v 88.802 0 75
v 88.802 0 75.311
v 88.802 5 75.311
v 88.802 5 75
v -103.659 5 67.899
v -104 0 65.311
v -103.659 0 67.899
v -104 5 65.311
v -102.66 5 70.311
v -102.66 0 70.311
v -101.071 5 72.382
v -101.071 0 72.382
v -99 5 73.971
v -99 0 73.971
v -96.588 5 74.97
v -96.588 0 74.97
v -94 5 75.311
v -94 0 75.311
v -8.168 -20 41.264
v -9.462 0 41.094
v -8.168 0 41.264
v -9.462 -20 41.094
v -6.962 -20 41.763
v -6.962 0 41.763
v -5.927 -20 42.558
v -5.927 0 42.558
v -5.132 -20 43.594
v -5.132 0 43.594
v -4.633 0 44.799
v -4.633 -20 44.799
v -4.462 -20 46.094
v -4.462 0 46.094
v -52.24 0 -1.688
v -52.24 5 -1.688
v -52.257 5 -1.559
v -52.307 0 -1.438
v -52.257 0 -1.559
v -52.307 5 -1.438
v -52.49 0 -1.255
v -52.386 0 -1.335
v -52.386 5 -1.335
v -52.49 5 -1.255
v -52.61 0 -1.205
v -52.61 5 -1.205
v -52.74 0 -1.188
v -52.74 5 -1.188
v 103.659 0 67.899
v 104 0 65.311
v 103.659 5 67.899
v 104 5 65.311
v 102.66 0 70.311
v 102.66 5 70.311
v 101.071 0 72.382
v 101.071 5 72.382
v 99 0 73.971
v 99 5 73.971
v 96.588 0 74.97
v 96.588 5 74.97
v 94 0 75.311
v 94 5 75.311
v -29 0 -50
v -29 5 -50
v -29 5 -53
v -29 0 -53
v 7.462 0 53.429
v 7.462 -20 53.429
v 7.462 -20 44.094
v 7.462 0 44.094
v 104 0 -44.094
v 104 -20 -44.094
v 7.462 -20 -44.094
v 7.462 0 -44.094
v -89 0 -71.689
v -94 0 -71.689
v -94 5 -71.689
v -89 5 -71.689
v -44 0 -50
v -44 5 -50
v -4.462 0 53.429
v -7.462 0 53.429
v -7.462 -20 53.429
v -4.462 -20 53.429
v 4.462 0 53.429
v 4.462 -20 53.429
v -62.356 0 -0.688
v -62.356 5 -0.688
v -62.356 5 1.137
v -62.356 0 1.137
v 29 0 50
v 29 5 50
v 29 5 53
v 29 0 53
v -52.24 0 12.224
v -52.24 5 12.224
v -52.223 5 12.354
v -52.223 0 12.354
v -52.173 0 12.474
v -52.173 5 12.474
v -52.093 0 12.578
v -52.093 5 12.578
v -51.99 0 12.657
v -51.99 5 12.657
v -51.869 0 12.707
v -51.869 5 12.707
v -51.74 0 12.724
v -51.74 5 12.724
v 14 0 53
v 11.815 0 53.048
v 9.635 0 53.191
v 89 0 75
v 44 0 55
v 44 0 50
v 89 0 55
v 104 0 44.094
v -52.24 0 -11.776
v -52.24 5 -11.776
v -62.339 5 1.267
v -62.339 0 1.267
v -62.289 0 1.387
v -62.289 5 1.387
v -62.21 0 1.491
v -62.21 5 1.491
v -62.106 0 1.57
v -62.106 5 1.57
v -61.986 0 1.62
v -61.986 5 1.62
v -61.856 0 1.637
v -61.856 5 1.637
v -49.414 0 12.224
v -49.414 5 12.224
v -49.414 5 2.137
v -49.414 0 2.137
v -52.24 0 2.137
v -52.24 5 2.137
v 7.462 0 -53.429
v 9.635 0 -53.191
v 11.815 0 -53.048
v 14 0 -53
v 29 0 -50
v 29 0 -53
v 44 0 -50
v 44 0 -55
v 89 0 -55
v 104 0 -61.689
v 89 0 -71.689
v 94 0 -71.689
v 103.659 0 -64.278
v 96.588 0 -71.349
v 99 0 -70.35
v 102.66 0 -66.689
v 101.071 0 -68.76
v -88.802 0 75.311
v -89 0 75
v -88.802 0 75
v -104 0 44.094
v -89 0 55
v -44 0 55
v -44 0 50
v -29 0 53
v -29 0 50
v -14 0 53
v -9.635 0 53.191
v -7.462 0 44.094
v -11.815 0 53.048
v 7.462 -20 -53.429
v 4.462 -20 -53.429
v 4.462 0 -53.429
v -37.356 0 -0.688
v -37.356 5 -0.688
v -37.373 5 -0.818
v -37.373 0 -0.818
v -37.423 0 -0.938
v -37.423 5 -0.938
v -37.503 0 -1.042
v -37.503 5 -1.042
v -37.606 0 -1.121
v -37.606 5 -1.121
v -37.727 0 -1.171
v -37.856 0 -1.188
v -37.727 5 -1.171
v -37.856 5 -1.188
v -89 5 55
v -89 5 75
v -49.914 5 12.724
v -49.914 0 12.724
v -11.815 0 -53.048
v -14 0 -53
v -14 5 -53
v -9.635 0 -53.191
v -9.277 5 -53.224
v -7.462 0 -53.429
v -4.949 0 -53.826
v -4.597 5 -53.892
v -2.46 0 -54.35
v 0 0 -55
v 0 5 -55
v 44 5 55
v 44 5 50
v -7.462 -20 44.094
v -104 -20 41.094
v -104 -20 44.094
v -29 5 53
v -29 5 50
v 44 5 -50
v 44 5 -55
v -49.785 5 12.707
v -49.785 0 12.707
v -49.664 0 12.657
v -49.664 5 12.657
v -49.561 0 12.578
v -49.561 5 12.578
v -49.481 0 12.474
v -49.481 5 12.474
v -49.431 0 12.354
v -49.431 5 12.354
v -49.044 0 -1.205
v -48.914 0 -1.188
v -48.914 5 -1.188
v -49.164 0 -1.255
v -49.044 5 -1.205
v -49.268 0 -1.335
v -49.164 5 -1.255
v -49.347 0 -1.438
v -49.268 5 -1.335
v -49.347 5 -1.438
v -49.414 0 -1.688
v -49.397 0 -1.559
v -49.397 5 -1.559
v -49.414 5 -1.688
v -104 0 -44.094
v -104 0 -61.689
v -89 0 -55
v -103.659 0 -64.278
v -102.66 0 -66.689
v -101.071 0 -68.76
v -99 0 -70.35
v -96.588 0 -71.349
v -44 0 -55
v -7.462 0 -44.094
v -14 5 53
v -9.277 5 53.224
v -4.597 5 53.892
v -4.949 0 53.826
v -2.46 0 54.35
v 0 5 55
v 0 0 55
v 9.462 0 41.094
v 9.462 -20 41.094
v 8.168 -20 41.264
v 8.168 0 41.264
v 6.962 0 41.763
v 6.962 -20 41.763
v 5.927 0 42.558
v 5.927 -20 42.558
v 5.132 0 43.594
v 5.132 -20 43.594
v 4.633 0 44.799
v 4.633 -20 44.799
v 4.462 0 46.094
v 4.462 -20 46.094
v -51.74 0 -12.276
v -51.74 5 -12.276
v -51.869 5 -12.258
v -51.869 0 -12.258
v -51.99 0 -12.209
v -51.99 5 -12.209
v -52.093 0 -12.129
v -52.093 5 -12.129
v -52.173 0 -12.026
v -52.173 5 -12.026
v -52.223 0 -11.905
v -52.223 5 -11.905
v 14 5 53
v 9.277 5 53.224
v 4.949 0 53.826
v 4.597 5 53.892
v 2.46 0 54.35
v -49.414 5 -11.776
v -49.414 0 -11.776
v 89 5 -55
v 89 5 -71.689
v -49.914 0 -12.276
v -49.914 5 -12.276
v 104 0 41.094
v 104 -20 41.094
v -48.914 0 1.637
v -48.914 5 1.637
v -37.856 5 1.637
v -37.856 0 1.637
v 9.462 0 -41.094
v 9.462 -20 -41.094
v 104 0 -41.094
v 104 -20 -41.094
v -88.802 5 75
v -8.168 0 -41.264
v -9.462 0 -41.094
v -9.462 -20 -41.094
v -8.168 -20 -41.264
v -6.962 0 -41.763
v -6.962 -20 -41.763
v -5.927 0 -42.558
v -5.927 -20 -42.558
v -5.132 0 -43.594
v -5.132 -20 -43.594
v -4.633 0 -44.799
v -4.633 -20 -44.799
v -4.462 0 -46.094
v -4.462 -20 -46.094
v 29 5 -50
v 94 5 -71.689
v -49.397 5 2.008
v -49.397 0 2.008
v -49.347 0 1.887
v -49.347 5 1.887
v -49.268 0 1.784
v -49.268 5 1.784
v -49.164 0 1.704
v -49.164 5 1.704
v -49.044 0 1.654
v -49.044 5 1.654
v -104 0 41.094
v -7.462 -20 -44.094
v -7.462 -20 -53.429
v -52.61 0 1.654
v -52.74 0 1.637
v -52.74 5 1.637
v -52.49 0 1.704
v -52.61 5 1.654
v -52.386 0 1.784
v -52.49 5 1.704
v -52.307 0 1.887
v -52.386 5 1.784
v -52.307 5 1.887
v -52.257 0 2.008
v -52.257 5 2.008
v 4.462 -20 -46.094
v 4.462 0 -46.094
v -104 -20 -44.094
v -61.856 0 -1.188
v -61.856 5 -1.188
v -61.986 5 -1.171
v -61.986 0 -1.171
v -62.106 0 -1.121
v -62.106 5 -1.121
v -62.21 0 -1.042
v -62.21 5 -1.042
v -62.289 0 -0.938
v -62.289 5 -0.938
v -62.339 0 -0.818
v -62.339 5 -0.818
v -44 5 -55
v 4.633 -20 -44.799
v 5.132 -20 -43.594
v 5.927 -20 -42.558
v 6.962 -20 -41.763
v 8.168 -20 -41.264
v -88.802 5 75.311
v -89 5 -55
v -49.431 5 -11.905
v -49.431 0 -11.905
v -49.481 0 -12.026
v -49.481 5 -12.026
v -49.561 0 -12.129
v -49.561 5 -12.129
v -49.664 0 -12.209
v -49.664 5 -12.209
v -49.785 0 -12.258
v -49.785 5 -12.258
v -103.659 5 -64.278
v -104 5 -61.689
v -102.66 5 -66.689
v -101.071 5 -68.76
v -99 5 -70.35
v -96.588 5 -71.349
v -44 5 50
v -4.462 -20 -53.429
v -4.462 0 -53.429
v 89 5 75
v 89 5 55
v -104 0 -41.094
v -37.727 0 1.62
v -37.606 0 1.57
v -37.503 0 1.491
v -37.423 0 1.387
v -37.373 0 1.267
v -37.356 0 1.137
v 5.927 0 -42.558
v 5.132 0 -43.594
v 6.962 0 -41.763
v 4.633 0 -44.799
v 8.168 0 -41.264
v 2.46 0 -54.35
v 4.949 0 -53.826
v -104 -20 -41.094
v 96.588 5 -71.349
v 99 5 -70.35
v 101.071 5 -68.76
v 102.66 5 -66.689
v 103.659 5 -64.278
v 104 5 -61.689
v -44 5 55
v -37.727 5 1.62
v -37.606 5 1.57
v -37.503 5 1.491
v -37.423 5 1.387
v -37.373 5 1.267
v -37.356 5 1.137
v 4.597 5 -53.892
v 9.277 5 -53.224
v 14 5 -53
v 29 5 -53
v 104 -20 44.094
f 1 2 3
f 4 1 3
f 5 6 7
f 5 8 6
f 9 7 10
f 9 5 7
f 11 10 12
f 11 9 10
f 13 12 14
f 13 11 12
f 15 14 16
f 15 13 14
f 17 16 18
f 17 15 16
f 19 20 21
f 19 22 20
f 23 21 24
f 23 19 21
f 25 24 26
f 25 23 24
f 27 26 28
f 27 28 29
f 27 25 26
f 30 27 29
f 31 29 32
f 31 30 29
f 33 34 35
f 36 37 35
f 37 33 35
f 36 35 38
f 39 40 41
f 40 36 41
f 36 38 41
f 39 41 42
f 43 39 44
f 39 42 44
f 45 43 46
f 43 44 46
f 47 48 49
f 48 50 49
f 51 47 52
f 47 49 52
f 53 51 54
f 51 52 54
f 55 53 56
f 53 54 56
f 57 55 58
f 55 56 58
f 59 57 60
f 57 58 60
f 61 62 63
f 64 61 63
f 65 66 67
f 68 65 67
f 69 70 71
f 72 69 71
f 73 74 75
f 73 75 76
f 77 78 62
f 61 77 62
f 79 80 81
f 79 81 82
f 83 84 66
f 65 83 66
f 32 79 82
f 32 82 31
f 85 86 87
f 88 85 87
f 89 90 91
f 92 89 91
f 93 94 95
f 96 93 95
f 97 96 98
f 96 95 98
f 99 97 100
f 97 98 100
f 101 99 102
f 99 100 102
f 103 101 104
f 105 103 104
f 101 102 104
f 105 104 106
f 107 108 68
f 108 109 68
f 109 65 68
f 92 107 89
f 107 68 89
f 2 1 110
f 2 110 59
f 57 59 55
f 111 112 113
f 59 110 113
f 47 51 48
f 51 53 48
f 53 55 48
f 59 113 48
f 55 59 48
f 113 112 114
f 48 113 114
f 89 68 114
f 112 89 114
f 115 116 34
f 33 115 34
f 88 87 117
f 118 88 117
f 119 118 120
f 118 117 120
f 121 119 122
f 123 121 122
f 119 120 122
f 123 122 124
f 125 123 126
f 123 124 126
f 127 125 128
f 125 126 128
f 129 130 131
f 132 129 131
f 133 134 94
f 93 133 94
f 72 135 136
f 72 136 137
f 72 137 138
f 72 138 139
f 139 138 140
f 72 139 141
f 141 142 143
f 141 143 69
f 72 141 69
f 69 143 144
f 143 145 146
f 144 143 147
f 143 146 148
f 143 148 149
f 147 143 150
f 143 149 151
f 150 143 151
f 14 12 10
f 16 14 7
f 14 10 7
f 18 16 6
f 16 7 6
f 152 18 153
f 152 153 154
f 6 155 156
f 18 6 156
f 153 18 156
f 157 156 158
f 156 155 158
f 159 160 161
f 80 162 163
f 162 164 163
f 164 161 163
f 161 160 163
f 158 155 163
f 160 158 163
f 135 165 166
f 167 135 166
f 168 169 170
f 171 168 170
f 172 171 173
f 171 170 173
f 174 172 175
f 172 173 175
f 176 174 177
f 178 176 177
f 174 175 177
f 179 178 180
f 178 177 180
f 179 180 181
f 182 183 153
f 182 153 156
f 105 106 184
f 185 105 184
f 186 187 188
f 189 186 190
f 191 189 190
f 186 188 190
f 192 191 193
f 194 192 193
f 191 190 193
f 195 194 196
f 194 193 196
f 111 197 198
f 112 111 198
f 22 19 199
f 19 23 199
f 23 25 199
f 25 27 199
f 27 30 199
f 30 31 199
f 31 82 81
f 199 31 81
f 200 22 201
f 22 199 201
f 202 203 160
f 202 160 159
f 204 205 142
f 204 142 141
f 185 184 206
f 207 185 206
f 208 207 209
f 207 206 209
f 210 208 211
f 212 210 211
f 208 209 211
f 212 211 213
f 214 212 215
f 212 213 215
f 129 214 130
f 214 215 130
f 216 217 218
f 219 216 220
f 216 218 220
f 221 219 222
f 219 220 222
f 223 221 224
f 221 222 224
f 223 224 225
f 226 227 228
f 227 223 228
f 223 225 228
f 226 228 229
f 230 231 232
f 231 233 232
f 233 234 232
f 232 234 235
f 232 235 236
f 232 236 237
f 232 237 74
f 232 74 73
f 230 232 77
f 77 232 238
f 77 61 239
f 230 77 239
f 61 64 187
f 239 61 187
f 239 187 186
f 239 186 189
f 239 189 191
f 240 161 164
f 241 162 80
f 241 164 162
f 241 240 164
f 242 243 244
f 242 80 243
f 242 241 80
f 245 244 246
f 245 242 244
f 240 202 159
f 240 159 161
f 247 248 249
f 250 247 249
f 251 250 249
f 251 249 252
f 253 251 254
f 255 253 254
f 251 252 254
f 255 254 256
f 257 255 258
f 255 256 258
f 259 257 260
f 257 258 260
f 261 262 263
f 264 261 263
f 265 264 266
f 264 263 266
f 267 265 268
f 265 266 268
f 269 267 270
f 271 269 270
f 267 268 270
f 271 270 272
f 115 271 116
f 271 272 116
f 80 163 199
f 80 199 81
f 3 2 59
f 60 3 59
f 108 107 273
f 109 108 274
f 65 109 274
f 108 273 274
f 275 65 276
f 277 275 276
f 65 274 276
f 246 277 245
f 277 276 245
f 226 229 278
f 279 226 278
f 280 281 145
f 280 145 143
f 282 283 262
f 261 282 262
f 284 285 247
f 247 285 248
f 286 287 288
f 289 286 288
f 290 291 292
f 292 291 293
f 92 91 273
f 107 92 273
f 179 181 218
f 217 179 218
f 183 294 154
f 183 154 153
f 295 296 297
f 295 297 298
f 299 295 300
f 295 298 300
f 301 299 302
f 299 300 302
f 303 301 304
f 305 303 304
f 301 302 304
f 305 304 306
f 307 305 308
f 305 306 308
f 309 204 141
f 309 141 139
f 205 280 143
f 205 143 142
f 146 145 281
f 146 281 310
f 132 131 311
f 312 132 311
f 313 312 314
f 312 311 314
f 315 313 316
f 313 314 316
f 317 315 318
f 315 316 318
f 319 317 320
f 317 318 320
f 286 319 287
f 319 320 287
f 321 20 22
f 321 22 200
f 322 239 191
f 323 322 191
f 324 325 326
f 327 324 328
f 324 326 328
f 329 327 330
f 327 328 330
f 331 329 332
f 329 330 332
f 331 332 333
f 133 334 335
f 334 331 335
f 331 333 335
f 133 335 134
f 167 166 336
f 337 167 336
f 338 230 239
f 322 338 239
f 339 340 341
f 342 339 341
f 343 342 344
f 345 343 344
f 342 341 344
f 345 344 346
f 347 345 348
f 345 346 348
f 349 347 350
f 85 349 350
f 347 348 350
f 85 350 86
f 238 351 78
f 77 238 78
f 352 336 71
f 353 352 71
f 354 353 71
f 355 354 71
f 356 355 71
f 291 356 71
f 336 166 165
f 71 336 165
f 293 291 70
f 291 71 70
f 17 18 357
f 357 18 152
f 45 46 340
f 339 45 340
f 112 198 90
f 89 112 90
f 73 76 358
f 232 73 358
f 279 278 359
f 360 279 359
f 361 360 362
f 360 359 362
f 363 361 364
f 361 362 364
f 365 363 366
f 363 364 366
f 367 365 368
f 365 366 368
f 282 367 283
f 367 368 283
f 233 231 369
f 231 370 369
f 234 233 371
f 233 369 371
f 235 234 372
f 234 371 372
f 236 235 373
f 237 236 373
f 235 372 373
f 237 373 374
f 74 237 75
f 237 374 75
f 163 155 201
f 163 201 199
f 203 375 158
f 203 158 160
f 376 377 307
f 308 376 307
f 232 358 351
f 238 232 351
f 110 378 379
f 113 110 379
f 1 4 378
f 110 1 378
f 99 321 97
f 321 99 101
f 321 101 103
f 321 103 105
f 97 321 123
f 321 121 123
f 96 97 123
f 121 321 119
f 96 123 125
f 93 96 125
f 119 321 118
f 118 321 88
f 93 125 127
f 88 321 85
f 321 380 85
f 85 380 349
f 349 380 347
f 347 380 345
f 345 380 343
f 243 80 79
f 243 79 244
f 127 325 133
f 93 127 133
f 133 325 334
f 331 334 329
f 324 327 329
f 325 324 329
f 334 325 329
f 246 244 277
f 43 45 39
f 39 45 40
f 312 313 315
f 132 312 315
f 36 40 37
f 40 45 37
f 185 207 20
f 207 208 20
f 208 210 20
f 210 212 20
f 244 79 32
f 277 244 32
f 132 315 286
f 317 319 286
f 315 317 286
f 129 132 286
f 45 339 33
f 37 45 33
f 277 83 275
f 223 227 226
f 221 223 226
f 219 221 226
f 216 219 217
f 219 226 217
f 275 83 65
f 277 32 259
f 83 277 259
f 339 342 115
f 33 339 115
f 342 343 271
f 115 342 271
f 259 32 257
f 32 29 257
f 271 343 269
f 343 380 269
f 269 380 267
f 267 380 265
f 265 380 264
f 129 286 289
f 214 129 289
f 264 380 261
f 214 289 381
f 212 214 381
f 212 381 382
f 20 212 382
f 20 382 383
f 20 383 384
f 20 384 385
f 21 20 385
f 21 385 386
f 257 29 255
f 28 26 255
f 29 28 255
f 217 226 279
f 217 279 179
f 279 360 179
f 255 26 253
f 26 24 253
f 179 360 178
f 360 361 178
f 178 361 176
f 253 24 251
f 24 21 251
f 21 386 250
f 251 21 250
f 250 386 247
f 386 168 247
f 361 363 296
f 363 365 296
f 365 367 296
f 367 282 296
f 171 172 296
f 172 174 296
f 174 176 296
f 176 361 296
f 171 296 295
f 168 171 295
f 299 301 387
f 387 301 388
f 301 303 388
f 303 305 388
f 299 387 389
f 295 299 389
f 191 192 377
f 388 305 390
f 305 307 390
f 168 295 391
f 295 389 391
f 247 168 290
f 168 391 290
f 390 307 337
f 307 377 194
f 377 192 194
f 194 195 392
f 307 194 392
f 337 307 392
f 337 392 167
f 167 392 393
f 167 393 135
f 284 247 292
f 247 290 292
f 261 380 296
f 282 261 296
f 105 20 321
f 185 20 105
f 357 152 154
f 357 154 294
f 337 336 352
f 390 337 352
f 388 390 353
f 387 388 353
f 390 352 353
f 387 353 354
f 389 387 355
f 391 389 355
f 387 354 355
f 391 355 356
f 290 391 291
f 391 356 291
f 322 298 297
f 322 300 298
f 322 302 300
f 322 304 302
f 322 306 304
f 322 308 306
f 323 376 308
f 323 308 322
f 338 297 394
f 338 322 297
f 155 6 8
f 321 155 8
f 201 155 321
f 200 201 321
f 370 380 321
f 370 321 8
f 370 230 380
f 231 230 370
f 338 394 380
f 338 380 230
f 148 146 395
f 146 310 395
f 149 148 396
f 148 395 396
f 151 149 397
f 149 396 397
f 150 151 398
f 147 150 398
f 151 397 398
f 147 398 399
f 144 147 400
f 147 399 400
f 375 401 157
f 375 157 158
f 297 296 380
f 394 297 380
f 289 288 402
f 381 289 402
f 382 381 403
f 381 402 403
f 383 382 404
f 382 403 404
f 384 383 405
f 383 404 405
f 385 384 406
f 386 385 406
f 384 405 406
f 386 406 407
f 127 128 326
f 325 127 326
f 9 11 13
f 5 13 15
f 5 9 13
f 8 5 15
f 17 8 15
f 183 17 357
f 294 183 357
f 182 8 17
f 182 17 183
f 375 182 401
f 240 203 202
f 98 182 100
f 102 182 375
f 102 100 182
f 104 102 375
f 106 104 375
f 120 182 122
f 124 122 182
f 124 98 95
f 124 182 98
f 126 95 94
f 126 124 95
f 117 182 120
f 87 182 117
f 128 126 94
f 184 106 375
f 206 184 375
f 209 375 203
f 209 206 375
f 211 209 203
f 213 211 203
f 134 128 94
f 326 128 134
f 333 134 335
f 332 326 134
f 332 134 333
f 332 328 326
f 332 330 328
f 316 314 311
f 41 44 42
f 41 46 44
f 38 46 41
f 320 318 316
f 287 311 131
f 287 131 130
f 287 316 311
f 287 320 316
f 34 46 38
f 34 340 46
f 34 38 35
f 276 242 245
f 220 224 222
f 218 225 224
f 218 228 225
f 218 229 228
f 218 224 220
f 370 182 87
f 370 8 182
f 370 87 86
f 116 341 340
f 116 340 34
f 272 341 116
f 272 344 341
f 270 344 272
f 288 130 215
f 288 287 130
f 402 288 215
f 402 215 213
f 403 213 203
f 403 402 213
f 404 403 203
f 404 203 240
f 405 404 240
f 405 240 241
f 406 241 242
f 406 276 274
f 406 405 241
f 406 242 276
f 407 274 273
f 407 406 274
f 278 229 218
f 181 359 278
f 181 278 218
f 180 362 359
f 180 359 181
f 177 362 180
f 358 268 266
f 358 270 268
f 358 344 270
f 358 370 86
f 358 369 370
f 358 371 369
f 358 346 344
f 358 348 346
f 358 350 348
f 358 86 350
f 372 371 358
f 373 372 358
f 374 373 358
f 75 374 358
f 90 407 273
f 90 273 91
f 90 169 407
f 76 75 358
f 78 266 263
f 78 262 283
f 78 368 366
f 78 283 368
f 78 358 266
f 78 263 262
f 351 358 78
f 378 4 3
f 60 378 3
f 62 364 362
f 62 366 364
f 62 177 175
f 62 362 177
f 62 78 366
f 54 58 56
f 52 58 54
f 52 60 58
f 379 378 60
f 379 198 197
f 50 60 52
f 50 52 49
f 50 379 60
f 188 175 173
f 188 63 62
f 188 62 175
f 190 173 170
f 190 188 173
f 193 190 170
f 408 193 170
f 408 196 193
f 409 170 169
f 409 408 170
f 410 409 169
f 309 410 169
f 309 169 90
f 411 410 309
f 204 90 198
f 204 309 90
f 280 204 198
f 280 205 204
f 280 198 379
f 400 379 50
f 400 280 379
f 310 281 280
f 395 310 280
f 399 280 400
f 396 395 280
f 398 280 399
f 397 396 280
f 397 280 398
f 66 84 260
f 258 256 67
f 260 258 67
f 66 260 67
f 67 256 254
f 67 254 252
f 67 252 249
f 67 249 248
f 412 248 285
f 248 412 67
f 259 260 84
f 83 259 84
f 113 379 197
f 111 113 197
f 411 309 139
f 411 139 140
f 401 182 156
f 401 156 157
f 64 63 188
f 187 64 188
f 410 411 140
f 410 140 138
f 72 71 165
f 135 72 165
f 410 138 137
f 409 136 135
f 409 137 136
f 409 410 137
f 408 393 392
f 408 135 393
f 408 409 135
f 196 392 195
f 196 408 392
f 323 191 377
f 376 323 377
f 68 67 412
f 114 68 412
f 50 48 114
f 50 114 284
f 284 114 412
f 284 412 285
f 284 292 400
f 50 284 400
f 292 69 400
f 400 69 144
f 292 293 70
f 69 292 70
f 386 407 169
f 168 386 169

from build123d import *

# Parameters (mm, degrees)
SKETCH1_W            = 208
SKETCH1_H            = 147
BOSS_EXTRUDE1_DEPTH  = 5
CUT_EXTRUDE1_DEPTH   = 129.501744983
SKETCH3_W            = 88.802487793
SKETCH3_H            = 5
CUT_EXTRUDE2_DEPTH   = 5
MIRROR3_COPY_1_DEPTH = 129.501744983
FILLET1_R            = 10
CUT_EXTRUDE3_DEPTH   = 129.501744983
BOSS_EXTRUDE2_DEPTH  = 20
FILLET2_R            = 5
FILLET2_OF_MIRROR4_R = 5
MIRROR5_START        = -20
MIRROR5_DEPTH        = 20


# Read off the part's stored shape, not the designer's step: Mirror5
with BuildPart() as part:
    # Sketch1 → Boss-Extrude1 (new body)
    with BuildSketch(Plane(origin=(0, 0, 0), x_dir=(1, 0, 0), z_dir=(0, 1, 0))):
        with Locations((0, -1.810679612)):
            Rectangle(SKETCH1_W, SKETCH1_H)
    extrude(amount=BOSS_EXTRUDE1_DEPTH)

    # Sketch2 → Cut-Extrude1 (cut, through all)
    with BuildSketch(Plane(origin=(0, 5, 0), x_dir=(1, 0, 0), z_dir=(0, 1, 0))):
        with BuildLine():
            Line((-89, 75), (-89, 55))
            Line((-89, 55), (-44, 55))
            Line((-44, 55), (-44, 50))
            Line((-44, 50), (-29, 50))
            Line((-29, 50), (-29, 53))
            Line((-29, 53), (-14, 53))
            ThreePointArc((-14, 53), (-6.928932188, 53.502525317), (0, 55))
            Line((0, 55), (0, 75))
            Line((0, 75), (-89, 75))
        make_face()
    cut_extrude1 = extrude(amount=-CUT_EXTRUDE1_DEPTH, mode=Mode.SUBTRACT)

    # Mirror1: Cut-Extrude1 across plane
    add(cut_extrude1.mirror(Plane.XY), mode=Mode.SUBTRACT)

    # Sketch3 → Cut-Extrude2 (cut)
    with BuildSketch(Plane.XY.offset(75.310679612)):
        with Locations((-44.401243897, 2.5)):
            Rectangle(SKETCH3_W, SKETCH3_H)
    cut_extrude2 = extrude(amount=-CUT_EXTRUDE2_DEPTH, mode=Mode.SUBTRACT)

    # Mirror3: Cut-Extrude1, Cut-Extrude2 across plane
    add(cut_extrude1.mirror(Plane(origin=(0, 0, 0), x_dir=(0, 0, 1), z_dir=(1, 0, 0))), mode=Mode.SUBTRACT)
    add(cut_extrude2.mirror(Plane(origin=(0, 0, 0), x_dir=(0, 0, 1), z_dir=(1, 0, 0))), mode=Mode.SUBTRACT)

    # Mirror3 copy 1 sketch → Mirror3 copy 1 (cut, through all)
    with BuildSketch(Plane(origin=(0, 5, 0), x_dir=(-1, 0, 0), z_dir=(0, 1, 0))):
        with BuildLine():
            Line((-89, 75), (-89, 55))
            Line((-89, 55), (-44, 55))
            Line((-44, 55), (-44, 50))
            Line((-44, 50), (-29, 50))
            Line((-29, 50), (-29, 53))
            Line((-29, 53), (-14, 53))
            ThreePointArc((-14, 53), (-6.928932188, 53.502525317), (0, 55))
            Line((0, 55), (0, 75))
            Line((0, 75), (-89, 75))
        make_face()
    extrude(amount=-MIRROR3_COPY_1_DEPTH, mode=Mode.SUBTRACT)

    # Fillet1
    fillet1_edges = [part.edges().sort_by_distance(p)[0] for p in [
        (104, 2.5, 75.310679612),
        (-104, 2.5, 75.310679612),
        (-104, 2.5, -71.689320388),
        (104, 2.5, -71.689320388),
    ]]
    fillet(fillet1_edges, radius=FILLET1_R)

    # Sketch4 → Cut-Extrude3 (cut, through all)
    with BuildSketch(Plane(origin=(0, 5, 0), x_dir=(1, 0, 0), z_dir=(0, 1, 0))):
        with BuildLine():
            Line((-52.239573725, -2.137194831), (-52.239573725, -12.224477428))
            ThreePointArc((-52.239573725, -12.224477428), (-52.093127116, -12.578030818), (-51.739573725, -12.724477428))
            Line((-51.739573725, -12.724477428), (-49.914138918, -12.724477428))
            ThreePointArc((-49.914138918, -12.724477428), (-49.560585528, -12.578030818), (-49.414138918, -12.224477428))
            Line((-49.414138918, -12.224477428), (-49.414138918, -2.137194831))
            ThreePointArc((-49.414138918, -2.137194831), (-49.267692309, -1.783641441), (-48.914138918, -1.637194831))
            Line((-48.914138918, -1.637194831), (-37.856129593, -1.637194831))
            ThreePointArc((-37.856129593, -1.637194831), (-37.502576202, -1.490748222), (-37.356129593, -1.137194831))
            Line((-37.356129593, -1.137194831), (-37.356129593, 0.688239976))
            ThreePointArc((-37.356129593, 0.688239976), (-37.502576202, 1.041793366), (-37.856129593, 1.188239976))
            Line((-37.856129593, 1.188239976), (-48.914138918, 1.188239976))
            ThreePointArc((-48.914138918, 1.188239976), (-49.267692309, 1.334686585), (-49.414138918, 1.688239976))
            Line((-49.414138918, 1.688239976), (-49.414138918, 11.775522572))
            ThreePointArc((-49.414138918, 11.775522572), (-49.560585528, 12.129075963), (-49.914138918, 12.275522572))
            Line((-49.914138918, 12.275522572), (-51.739573725, 12.275522572))
            ThreePointArc((-51.739573725, 12.275522572), (-52.093127116, 12.129075963), (-52.239573725, 11.775522572))
            Line((-52.239573725, 11.775522572), (-52.239573725, 1.688239976))
            ThreePointArc((-52.239573725, 1.688239976), (-52.386020335, 1.334686585), (-52.739573725, 1.188239976))
            Line((-52.739573725, 1.188239976), (-61.856129593, 1.188239976))
            ThreePointArc((-61.856129593, 1.188239976), (-62.209682983, 1.041793366), (-62.356129593, 0.688239976))
            Line((-62.356129593, 0.688239976), (-62.356129593, -1.137194831))
            ThreePointArc((-62.356129593, -1.137194831), (-62.209682983, -1.490748222), (-61.856129593, -1.637194831))
            Line((-61.856129593, -1.637194831), (-52.739573725, -1.637194831))
            ThreePointArc((-52.739573725, -1.637194831), (-52.386020335, -1.783641441), (-52.239573725, -2.137194831))
        make_face()
    extrude(amount=-CUT_EXTRUDE3_DEPTH, mode=Mode.SUBTRACT)

    # Sketch5 → Boss-Extrude2 (add)
    with BuildSketch(Plane.XZ):
        Polygon((-104, 44.093533077), (-7.462222255, 44.093533077), (-7.462222255, 53.429268089), (-4.462222255, 53.429268089), (-4.462222255, 41.093533077), (-104, 41.093533077), align=None)
    boss_extrude2 = extrude(amount=BOSS_EXTRUDE2_DEPTH)

    # Fillet2
    fillet2_edges = [part.edges().sort_by_distance(p)[0] for p in [
        (-4.462222255, -10, 41.093533077),
    ]]
    fillet(fillet2_edges, radius=FILLET2_R)

    # Mirror4: Boss-Extrude2 across plane
    add(boss_extrude2.mirror(Plane.XY))

    # Fillet2 of Mirror4
    fillet2_of_mirror4_edges = [part.edges().sort_by_distance(p)[0] for p in [
        (-4.462222255, -10, -41.093533077),
    ]]
    fillet(fillet2_of_mirror4_edges, radius=FILLET2_OF_MIRROR4_R)

    # Mirror5 outline → Mirror5 (add)
    with BuildSketch(Plane(origin=(0, 0, 0), x_dir=(1, 0, 0), z_dir=(0, 1, 0)).offset(MIRROR5_START)):
        with BuildLine():
            Line((104, -44.093533077), (104, -41.093533077))
            Line((104, -41.093533077), (9.462222255, -41.093533077))
            ThreePointArc((9.462222255, -41.093533077), (5.926688349, -42.557999171), (4.462222255, -46.093533077))
            Line((4.462222255, -46.093533077), (4.462222255, -53.429268089))
            Line((4.462222255, -53.429268089), (7.462222255, -53.429268089))
            Line((7.462222255, -53.429268089), (7.462222255, -44.093533077))
            Line((7.462222255, -44.093533077), (104, -44.093533077))
        make_face()
        with BuildLine():
            Line((9.462222255, 41.093533077), (104, 41.093533077))
            Line((104, 41.093533077), (104, 44.093533077))
            Line((104, 44.093533077), (7.462222255, 44.093533077))
            Line((7.462222255, 44.093533077), (7.462222255, 53.429268089))
            Line((7.462222255, 53.429268089), (4.462222255, 53.429268089))
            Line((4.462222255, 53.429268089), (4.462222255, 46.093533077))
            ThreePointArc((4.462222255, 46.093533077), (5.926688349, 42.557999171), (9.462222255, 41.093533077))
        make_face()
    extrude(amount=MIRROR5_DEPTH)


solid = part.part
